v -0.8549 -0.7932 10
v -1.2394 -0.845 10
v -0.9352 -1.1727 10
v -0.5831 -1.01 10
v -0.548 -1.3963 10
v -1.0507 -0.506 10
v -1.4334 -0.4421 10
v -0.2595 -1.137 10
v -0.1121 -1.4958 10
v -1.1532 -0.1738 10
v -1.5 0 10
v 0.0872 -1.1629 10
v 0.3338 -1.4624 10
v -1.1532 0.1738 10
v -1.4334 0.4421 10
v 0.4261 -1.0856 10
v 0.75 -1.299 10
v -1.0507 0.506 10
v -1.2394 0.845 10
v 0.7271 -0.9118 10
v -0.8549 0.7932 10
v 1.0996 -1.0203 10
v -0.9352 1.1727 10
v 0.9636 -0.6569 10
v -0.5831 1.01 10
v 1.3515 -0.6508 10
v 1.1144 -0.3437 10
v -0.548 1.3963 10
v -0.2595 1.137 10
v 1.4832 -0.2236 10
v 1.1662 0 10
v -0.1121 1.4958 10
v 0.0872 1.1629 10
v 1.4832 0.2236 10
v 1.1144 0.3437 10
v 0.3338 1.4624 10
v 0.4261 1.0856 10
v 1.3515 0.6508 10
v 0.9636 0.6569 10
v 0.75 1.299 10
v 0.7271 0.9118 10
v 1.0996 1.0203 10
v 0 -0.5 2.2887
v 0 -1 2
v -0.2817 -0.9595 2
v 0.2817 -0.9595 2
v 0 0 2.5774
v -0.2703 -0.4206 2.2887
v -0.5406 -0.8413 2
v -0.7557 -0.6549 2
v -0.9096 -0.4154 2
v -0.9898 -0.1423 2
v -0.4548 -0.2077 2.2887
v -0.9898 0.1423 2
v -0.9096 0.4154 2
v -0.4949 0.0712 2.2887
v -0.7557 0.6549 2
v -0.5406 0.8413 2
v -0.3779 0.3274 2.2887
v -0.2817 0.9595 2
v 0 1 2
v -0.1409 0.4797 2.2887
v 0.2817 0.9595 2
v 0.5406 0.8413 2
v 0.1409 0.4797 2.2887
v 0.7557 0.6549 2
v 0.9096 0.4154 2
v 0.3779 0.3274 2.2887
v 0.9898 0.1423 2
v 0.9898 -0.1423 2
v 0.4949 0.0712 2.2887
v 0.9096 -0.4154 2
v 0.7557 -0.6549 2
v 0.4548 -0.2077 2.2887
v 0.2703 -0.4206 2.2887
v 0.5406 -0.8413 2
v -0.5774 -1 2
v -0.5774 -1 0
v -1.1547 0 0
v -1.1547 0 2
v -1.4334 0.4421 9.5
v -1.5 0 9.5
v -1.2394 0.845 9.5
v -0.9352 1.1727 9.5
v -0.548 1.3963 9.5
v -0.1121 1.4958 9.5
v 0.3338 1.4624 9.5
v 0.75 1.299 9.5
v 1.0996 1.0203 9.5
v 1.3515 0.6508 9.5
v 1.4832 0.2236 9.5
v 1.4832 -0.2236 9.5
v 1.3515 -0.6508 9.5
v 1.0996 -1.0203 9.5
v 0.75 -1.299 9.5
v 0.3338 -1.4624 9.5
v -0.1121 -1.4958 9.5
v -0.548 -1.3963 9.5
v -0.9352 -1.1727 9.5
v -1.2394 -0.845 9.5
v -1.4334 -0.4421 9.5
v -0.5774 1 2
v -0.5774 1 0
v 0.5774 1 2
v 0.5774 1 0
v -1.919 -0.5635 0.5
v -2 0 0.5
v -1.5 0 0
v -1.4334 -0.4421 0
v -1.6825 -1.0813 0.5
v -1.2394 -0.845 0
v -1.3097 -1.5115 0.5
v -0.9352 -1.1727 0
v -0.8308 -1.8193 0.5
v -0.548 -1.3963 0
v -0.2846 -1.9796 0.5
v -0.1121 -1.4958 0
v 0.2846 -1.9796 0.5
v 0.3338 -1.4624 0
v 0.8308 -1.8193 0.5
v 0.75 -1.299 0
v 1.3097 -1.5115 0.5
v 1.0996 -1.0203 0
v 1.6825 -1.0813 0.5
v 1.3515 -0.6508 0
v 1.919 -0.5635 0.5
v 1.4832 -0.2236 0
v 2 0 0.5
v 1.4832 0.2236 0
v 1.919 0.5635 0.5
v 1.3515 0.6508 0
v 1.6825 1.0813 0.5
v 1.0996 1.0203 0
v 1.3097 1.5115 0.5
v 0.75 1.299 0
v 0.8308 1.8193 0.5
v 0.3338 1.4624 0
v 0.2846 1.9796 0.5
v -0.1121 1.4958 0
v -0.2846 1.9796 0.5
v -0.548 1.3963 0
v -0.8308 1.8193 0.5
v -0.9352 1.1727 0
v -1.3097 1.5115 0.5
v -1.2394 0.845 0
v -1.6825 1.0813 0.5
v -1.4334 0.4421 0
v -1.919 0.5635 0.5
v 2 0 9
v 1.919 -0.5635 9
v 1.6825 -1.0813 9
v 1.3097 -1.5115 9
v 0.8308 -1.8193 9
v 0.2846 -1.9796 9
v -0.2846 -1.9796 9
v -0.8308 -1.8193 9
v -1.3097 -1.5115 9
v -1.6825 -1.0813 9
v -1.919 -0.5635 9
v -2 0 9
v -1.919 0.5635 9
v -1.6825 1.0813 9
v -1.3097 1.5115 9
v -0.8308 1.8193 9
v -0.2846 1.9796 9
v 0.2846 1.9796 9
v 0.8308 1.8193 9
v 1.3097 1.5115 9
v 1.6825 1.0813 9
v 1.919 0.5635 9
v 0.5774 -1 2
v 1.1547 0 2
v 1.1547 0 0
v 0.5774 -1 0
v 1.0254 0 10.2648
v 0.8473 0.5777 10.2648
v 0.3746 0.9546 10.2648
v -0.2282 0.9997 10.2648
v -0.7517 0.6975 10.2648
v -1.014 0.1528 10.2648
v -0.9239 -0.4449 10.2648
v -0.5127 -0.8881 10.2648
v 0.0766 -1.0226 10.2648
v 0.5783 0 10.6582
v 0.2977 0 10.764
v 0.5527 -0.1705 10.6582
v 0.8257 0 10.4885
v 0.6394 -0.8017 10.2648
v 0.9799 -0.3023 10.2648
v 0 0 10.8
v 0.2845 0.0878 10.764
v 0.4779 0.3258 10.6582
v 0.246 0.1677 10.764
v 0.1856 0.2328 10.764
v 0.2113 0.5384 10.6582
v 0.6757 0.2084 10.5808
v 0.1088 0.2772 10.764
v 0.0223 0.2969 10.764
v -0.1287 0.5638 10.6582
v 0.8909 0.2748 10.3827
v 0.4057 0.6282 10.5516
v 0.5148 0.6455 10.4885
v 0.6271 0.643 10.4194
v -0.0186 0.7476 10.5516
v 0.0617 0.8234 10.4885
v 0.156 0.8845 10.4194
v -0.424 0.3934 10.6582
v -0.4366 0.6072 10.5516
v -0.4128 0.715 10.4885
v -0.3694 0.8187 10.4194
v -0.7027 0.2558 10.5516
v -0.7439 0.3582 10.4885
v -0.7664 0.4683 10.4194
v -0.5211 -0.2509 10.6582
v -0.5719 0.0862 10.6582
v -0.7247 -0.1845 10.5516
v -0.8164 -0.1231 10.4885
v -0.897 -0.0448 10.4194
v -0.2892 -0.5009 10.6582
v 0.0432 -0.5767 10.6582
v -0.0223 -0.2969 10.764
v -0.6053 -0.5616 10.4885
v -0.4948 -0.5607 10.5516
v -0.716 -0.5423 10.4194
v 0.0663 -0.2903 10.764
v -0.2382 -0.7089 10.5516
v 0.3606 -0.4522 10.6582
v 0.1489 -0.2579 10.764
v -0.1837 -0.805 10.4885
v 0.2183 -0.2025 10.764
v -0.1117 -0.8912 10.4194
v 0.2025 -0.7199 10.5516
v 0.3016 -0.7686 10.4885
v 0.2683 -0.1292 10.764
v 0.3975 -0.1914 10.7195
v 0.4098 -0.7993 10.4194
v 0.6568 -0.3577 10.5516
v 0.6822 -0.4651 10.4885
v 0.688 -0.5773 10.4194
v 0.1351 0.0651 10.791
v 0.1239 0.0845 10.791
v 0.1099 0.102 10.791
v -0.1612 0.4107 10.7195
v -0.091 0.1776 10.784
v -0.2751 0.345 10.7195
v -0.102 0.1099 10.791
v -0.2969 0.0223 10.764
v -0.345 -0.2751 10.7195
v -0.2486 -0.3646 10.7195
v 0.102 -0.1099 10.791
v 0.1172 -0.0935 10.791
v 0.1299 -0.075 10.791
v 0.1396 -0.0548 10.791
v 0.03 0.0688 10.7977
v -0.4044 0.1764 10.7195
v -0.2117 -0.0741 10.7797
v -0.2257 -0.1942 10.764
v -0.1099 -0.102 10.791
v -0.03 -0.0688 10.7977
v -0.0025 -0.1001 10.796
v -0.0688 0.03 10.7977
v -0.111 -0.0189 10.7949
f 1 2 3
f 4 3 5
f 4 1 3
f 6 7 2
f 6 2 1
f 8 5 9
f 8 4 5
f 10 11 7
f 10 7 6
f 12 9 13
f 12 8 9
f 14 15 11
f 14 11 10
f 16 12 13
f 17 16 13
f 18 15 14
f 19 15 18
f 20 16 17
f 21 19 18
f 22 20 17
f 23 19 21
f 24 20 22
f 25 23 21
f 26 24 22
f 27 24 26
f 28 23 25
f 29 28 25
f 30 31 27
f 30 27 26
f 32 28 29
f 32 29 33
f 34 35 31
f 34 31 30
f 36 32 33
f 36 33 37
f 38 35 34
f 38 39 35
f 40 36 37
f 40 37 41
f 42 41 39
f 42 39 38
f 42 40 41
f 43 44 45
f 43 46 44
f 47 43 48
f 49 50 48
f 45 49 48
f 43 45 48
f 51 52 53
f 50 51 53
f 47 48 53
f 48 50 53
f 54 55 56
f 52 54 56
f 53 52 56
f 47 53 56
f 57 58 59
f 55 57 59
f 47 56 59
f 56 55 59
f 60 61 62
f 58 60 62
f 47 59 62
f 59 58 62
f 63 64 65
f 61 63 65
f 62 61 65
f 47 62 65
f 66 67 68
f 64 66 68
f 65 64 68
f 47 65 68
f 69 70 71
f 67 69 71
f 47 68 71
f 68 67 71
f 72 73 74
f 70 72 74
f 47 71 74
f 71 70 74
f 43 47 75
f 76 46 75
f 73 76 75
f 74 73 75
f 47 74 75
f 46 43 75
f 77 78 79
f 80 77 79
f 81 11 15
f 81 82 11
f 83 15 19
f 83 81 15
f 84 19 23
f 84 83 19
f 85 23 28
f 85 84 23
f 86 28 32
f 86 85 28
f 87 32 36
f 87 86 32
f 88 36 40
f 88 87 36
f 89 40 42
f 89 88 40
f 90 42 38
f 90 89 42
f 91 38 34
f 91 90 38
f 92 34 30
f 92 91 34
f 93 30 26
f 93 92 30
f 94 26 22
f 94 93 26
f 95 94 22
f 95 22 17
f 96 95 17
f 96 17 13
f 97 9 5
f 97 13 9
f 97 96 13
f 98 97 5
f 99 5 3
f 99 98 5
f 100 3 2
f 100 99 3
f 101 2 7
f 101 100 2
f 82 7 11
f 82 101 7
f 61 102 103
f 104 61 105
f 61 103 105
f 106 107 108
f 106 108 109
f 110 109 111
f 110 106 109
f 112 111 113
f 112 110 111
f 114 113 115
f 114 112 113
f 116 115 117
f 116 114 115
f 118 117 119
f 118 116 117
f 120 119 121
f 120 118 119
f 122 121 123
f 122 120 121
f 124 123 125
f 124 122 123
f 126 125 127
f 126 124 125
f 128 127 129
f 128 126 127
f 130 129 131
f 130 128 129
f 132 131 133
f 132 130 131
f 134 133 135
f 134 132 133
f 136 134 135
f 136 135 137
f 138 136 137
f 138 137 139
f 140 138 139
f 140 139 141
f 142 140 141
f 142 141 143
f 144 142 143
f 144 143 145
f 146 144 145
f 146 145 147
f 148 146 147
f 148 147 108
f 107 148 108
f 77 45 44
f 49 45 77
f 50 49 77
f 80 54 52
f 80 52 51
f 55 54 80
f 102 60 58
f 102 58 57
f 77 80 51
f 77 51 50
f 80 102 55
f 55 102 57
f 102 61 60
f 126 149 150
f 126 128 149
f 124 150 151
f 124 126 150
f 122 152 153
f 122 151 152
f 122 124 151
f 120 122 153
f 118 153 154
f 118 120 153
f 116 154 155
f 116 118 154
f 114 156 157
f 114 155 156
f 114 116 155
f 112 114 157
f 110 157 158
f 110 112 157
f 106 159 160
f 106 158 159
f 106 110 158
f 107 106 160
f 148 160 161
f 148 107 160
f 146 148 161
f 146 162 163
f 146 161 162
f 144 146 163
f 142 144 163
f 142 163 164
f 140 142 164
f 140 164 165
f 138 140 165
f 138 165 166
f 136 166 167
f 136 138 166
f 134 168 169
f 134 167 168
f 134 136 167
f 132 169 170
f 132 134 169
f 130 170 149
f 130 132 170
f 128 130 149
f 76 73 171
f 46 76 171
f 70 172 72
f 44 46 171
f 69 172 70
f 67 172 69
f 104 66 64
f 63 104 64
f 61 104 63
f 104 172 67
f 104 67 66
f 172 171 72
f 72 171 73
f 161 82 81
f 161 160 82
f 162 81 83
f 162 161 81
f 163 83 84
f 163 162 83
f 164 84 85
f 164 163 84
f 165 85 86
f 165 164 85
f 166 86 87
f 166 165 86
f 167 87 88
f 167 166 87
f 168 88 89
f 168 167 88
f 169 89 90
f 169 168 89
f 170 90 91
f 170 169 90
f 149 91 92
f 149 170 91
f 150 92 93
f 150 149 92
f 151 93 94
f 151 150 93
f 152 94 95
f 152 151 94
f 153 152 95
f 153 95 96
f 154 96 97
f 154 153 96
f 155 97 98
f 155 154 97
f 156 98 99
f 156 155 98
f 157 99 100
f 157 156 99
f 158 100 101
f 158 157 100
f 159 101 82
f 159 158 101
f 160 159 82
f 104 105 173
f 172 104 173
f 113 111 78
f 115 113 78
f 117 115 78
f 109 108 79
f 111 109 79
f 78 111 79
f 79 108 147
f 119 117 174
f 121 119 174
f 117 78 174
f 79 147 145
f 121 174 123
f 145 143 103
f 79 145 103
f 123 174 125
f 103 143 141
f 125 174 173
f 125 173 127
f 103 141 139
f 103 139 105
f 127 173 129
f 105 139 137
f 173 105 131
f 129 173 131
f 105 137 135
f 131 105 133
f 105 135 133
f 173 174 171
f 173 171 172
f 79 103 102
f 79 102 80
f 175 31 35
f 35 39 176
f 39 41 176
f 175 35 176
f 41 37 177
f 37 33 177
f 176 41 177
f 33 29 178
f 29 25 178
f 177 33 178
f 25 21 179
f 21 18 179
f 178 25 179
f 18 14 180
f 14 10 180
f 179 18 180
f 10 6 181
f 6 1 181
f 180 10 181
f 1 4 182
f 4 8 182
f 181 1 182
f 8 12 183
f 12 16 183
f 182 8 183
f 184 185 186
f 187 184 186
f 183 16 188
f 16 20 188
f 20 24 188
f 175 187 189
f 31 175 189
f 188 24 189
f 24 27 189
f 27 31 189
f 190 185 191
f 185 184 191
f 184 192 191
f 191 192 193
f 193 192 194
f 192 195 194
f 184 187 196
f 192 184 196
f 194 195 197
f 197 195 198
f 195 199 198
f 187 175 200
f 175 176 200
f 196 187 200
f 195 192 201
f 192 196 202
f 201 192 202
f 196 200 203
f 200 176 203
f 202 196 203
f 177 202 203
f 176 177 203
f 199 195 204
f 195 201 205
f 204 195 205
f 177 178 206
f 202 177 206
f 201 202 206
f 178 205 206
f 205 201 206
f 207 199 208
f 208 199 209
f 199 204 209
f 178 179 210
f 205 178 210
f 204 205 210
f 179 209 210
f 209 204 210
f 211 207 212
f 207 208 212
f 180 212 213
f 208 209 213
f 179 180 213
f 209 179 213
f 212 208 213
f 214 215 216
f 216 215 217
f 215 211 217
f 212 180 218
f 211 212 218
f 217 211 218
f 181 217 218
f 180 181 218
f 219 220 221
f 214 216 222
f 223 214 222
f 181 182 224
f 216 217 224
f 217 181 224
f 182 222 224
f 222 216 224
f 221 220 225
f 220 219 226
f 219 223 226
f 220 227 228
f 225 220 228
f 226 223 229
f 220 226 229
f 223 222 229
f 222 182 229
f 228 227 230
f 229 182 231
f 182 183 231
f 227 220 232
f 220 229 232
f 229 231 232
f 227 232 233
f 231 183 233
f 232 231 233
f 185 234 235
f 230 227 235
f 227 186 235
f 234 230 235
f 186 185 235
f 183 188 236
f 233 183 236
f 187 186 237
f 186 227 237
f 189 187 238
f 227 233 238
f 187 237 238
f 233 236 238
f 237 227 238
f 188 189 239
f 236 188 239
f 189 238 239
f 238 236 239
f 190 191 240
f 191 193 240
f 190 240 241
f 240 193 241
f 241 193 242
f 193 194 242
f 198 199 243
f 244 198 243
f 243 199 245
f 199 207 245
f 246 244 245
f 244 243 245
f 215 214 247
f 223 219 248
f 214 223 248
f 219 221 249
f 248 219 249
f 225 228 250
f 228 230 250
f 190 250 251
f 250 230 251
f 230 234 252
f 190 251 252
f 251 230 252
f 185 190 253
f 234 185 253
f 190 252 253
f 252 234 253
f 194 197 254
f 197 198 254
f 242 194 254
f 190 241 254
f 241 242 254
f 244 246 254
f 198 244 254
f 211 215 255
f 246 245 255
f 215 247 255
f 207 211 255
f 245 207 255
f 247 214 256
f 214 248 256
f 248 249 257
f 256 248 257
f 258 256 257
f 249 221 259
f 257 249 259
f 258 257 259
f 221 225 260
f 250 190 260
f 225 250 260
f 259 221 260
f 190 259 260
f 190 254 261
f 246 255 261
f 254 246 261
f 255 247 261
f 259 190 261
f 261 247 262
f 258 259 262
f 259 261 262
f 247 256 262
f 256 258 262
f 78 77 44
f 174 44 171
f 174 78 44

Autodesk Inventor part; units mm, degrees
ref_plane "YZ Plane" through (0, 0, 0) normal (1, 0, 0) x (0, 1, 0)
ref_plane "XZ Plane" through (0, 0, 0) normal (0, 1, 0) x (-1, 0, 0)
ref_plane "XY Plane" through (0, 0, 0) normal (0, 0, 1) x (1, 0, 0)
sketch "Sketch1" plane through (0, 0, 0) normal (0, 0, 1) x (1, 0, 0)
  circle A0 centre (0, 0) radius 2
  dimension "d0" = 4
extrude "Extrusion1" add sketch "Sketch1" along normal blind 10
thread "Thread1" size "M4x0.7" class "6g" standard "ISO Metric profile" full length
sketch "Sketch2" plane through (0, 0, 0) normal (0, 1, 0) x (-1, 0, 0)
  line L0 (2, 0) -> (2, 10) projected
  line L1 (2, 0) -> (2, 0.5)
  line L2 (2, 0.5) -> (1.5, 0)
  line L3 (-2, 0) -> (2, 0) projected
  line L4 (2, 10) -> (-2, 10) projected
  line L5 (2, 10) -> (1.5, 10)
  line L6 (1.5, 10) -> (1.5, 9.5)
  line L7 (1.5, 9.5) -> (2, 9)
  line L8 (0, -2) -> (0, 12) projected
  point P0 (0, 0)
  dimension "d5" = 0.5
  dimension "d6" = 45
  dimension "d7" = 0.5
  dimension "d8" = 0.5
revolve "Revolution1" cut sketch "Sketch2" angle 360 about axis through (0, 0, -10) along (0, 0, 1) contours L3 L2 L0 | L7 L6 L4 L0
sketch "Sketch3" plane through (0, 0, 0) normal (0, 1, 0) x (-1, 0, 0)
  arc A0 (0, 10.8) -> (-1.1662, 10) centre (0, 9.55) ccw
  line L0 (1.5, 10) -> (-1.5, 10) projected
  line L1 (0, 10.8) -> (0, 10)
  line L2 (0, -2.1962) -> (0, 13.1769) projected
  point P0 (0, 0)
  dimension "d11" = 2.5
revolve "Revolution2" add sketch "Sketch3" angle 360 about axis through (0, 0, -10) along (0, 0, 1)
sketch "Sketch5" plane through (0, 0, 0) normal (0, 0, -1) x (-1, 0, 0)
  circle A0 centre (0, 0) radius 1
  line L0 (0.5774, -1) -> (-0.5774, -1)
  line L1 (-0.5774, -1) -> (-1.1547, 0)
  line L2 (0.5774, -1) -> (1.1547, 0)
  line L3 (0.5774, 1) -> (-0.5774, 1)
  line L4 (-0.5774, 1) -> (-1.1547, 0)
  line L5 (0.5774, 1) -> (1.1547, 0)
  dimension "d16" = 2
  dimension "d23" = 120
  dimension "d24" = 120
extrude "Extrusion2" cut sketch "Sketch5" against normal blind 2
sketch "Sketch7" plane through (0, 0, 0) normal (1, 0, 0) x (0, 1, 0)
  line L0 (0, 0) -> (0, 2) projected
  line L1 (-1, 0) -> (-1, 2) projected
  line L2 (0, 2) -> (-1, 2)
  line L3 (-1, 2) -> (0, 2.5774)
  line L4 (0, 2.5774) -> (0, 2)
  line L5 (0, -2.16) -> (0, 12.96) projected
  dimension "d28" = 60
revolve "Revolution3" cut sketch "Sketch7" angle 360 about axis through (0, 0, -10) along (0, 0, 1)
properties part number "wkret_z_kulka" material "Ogólne"
